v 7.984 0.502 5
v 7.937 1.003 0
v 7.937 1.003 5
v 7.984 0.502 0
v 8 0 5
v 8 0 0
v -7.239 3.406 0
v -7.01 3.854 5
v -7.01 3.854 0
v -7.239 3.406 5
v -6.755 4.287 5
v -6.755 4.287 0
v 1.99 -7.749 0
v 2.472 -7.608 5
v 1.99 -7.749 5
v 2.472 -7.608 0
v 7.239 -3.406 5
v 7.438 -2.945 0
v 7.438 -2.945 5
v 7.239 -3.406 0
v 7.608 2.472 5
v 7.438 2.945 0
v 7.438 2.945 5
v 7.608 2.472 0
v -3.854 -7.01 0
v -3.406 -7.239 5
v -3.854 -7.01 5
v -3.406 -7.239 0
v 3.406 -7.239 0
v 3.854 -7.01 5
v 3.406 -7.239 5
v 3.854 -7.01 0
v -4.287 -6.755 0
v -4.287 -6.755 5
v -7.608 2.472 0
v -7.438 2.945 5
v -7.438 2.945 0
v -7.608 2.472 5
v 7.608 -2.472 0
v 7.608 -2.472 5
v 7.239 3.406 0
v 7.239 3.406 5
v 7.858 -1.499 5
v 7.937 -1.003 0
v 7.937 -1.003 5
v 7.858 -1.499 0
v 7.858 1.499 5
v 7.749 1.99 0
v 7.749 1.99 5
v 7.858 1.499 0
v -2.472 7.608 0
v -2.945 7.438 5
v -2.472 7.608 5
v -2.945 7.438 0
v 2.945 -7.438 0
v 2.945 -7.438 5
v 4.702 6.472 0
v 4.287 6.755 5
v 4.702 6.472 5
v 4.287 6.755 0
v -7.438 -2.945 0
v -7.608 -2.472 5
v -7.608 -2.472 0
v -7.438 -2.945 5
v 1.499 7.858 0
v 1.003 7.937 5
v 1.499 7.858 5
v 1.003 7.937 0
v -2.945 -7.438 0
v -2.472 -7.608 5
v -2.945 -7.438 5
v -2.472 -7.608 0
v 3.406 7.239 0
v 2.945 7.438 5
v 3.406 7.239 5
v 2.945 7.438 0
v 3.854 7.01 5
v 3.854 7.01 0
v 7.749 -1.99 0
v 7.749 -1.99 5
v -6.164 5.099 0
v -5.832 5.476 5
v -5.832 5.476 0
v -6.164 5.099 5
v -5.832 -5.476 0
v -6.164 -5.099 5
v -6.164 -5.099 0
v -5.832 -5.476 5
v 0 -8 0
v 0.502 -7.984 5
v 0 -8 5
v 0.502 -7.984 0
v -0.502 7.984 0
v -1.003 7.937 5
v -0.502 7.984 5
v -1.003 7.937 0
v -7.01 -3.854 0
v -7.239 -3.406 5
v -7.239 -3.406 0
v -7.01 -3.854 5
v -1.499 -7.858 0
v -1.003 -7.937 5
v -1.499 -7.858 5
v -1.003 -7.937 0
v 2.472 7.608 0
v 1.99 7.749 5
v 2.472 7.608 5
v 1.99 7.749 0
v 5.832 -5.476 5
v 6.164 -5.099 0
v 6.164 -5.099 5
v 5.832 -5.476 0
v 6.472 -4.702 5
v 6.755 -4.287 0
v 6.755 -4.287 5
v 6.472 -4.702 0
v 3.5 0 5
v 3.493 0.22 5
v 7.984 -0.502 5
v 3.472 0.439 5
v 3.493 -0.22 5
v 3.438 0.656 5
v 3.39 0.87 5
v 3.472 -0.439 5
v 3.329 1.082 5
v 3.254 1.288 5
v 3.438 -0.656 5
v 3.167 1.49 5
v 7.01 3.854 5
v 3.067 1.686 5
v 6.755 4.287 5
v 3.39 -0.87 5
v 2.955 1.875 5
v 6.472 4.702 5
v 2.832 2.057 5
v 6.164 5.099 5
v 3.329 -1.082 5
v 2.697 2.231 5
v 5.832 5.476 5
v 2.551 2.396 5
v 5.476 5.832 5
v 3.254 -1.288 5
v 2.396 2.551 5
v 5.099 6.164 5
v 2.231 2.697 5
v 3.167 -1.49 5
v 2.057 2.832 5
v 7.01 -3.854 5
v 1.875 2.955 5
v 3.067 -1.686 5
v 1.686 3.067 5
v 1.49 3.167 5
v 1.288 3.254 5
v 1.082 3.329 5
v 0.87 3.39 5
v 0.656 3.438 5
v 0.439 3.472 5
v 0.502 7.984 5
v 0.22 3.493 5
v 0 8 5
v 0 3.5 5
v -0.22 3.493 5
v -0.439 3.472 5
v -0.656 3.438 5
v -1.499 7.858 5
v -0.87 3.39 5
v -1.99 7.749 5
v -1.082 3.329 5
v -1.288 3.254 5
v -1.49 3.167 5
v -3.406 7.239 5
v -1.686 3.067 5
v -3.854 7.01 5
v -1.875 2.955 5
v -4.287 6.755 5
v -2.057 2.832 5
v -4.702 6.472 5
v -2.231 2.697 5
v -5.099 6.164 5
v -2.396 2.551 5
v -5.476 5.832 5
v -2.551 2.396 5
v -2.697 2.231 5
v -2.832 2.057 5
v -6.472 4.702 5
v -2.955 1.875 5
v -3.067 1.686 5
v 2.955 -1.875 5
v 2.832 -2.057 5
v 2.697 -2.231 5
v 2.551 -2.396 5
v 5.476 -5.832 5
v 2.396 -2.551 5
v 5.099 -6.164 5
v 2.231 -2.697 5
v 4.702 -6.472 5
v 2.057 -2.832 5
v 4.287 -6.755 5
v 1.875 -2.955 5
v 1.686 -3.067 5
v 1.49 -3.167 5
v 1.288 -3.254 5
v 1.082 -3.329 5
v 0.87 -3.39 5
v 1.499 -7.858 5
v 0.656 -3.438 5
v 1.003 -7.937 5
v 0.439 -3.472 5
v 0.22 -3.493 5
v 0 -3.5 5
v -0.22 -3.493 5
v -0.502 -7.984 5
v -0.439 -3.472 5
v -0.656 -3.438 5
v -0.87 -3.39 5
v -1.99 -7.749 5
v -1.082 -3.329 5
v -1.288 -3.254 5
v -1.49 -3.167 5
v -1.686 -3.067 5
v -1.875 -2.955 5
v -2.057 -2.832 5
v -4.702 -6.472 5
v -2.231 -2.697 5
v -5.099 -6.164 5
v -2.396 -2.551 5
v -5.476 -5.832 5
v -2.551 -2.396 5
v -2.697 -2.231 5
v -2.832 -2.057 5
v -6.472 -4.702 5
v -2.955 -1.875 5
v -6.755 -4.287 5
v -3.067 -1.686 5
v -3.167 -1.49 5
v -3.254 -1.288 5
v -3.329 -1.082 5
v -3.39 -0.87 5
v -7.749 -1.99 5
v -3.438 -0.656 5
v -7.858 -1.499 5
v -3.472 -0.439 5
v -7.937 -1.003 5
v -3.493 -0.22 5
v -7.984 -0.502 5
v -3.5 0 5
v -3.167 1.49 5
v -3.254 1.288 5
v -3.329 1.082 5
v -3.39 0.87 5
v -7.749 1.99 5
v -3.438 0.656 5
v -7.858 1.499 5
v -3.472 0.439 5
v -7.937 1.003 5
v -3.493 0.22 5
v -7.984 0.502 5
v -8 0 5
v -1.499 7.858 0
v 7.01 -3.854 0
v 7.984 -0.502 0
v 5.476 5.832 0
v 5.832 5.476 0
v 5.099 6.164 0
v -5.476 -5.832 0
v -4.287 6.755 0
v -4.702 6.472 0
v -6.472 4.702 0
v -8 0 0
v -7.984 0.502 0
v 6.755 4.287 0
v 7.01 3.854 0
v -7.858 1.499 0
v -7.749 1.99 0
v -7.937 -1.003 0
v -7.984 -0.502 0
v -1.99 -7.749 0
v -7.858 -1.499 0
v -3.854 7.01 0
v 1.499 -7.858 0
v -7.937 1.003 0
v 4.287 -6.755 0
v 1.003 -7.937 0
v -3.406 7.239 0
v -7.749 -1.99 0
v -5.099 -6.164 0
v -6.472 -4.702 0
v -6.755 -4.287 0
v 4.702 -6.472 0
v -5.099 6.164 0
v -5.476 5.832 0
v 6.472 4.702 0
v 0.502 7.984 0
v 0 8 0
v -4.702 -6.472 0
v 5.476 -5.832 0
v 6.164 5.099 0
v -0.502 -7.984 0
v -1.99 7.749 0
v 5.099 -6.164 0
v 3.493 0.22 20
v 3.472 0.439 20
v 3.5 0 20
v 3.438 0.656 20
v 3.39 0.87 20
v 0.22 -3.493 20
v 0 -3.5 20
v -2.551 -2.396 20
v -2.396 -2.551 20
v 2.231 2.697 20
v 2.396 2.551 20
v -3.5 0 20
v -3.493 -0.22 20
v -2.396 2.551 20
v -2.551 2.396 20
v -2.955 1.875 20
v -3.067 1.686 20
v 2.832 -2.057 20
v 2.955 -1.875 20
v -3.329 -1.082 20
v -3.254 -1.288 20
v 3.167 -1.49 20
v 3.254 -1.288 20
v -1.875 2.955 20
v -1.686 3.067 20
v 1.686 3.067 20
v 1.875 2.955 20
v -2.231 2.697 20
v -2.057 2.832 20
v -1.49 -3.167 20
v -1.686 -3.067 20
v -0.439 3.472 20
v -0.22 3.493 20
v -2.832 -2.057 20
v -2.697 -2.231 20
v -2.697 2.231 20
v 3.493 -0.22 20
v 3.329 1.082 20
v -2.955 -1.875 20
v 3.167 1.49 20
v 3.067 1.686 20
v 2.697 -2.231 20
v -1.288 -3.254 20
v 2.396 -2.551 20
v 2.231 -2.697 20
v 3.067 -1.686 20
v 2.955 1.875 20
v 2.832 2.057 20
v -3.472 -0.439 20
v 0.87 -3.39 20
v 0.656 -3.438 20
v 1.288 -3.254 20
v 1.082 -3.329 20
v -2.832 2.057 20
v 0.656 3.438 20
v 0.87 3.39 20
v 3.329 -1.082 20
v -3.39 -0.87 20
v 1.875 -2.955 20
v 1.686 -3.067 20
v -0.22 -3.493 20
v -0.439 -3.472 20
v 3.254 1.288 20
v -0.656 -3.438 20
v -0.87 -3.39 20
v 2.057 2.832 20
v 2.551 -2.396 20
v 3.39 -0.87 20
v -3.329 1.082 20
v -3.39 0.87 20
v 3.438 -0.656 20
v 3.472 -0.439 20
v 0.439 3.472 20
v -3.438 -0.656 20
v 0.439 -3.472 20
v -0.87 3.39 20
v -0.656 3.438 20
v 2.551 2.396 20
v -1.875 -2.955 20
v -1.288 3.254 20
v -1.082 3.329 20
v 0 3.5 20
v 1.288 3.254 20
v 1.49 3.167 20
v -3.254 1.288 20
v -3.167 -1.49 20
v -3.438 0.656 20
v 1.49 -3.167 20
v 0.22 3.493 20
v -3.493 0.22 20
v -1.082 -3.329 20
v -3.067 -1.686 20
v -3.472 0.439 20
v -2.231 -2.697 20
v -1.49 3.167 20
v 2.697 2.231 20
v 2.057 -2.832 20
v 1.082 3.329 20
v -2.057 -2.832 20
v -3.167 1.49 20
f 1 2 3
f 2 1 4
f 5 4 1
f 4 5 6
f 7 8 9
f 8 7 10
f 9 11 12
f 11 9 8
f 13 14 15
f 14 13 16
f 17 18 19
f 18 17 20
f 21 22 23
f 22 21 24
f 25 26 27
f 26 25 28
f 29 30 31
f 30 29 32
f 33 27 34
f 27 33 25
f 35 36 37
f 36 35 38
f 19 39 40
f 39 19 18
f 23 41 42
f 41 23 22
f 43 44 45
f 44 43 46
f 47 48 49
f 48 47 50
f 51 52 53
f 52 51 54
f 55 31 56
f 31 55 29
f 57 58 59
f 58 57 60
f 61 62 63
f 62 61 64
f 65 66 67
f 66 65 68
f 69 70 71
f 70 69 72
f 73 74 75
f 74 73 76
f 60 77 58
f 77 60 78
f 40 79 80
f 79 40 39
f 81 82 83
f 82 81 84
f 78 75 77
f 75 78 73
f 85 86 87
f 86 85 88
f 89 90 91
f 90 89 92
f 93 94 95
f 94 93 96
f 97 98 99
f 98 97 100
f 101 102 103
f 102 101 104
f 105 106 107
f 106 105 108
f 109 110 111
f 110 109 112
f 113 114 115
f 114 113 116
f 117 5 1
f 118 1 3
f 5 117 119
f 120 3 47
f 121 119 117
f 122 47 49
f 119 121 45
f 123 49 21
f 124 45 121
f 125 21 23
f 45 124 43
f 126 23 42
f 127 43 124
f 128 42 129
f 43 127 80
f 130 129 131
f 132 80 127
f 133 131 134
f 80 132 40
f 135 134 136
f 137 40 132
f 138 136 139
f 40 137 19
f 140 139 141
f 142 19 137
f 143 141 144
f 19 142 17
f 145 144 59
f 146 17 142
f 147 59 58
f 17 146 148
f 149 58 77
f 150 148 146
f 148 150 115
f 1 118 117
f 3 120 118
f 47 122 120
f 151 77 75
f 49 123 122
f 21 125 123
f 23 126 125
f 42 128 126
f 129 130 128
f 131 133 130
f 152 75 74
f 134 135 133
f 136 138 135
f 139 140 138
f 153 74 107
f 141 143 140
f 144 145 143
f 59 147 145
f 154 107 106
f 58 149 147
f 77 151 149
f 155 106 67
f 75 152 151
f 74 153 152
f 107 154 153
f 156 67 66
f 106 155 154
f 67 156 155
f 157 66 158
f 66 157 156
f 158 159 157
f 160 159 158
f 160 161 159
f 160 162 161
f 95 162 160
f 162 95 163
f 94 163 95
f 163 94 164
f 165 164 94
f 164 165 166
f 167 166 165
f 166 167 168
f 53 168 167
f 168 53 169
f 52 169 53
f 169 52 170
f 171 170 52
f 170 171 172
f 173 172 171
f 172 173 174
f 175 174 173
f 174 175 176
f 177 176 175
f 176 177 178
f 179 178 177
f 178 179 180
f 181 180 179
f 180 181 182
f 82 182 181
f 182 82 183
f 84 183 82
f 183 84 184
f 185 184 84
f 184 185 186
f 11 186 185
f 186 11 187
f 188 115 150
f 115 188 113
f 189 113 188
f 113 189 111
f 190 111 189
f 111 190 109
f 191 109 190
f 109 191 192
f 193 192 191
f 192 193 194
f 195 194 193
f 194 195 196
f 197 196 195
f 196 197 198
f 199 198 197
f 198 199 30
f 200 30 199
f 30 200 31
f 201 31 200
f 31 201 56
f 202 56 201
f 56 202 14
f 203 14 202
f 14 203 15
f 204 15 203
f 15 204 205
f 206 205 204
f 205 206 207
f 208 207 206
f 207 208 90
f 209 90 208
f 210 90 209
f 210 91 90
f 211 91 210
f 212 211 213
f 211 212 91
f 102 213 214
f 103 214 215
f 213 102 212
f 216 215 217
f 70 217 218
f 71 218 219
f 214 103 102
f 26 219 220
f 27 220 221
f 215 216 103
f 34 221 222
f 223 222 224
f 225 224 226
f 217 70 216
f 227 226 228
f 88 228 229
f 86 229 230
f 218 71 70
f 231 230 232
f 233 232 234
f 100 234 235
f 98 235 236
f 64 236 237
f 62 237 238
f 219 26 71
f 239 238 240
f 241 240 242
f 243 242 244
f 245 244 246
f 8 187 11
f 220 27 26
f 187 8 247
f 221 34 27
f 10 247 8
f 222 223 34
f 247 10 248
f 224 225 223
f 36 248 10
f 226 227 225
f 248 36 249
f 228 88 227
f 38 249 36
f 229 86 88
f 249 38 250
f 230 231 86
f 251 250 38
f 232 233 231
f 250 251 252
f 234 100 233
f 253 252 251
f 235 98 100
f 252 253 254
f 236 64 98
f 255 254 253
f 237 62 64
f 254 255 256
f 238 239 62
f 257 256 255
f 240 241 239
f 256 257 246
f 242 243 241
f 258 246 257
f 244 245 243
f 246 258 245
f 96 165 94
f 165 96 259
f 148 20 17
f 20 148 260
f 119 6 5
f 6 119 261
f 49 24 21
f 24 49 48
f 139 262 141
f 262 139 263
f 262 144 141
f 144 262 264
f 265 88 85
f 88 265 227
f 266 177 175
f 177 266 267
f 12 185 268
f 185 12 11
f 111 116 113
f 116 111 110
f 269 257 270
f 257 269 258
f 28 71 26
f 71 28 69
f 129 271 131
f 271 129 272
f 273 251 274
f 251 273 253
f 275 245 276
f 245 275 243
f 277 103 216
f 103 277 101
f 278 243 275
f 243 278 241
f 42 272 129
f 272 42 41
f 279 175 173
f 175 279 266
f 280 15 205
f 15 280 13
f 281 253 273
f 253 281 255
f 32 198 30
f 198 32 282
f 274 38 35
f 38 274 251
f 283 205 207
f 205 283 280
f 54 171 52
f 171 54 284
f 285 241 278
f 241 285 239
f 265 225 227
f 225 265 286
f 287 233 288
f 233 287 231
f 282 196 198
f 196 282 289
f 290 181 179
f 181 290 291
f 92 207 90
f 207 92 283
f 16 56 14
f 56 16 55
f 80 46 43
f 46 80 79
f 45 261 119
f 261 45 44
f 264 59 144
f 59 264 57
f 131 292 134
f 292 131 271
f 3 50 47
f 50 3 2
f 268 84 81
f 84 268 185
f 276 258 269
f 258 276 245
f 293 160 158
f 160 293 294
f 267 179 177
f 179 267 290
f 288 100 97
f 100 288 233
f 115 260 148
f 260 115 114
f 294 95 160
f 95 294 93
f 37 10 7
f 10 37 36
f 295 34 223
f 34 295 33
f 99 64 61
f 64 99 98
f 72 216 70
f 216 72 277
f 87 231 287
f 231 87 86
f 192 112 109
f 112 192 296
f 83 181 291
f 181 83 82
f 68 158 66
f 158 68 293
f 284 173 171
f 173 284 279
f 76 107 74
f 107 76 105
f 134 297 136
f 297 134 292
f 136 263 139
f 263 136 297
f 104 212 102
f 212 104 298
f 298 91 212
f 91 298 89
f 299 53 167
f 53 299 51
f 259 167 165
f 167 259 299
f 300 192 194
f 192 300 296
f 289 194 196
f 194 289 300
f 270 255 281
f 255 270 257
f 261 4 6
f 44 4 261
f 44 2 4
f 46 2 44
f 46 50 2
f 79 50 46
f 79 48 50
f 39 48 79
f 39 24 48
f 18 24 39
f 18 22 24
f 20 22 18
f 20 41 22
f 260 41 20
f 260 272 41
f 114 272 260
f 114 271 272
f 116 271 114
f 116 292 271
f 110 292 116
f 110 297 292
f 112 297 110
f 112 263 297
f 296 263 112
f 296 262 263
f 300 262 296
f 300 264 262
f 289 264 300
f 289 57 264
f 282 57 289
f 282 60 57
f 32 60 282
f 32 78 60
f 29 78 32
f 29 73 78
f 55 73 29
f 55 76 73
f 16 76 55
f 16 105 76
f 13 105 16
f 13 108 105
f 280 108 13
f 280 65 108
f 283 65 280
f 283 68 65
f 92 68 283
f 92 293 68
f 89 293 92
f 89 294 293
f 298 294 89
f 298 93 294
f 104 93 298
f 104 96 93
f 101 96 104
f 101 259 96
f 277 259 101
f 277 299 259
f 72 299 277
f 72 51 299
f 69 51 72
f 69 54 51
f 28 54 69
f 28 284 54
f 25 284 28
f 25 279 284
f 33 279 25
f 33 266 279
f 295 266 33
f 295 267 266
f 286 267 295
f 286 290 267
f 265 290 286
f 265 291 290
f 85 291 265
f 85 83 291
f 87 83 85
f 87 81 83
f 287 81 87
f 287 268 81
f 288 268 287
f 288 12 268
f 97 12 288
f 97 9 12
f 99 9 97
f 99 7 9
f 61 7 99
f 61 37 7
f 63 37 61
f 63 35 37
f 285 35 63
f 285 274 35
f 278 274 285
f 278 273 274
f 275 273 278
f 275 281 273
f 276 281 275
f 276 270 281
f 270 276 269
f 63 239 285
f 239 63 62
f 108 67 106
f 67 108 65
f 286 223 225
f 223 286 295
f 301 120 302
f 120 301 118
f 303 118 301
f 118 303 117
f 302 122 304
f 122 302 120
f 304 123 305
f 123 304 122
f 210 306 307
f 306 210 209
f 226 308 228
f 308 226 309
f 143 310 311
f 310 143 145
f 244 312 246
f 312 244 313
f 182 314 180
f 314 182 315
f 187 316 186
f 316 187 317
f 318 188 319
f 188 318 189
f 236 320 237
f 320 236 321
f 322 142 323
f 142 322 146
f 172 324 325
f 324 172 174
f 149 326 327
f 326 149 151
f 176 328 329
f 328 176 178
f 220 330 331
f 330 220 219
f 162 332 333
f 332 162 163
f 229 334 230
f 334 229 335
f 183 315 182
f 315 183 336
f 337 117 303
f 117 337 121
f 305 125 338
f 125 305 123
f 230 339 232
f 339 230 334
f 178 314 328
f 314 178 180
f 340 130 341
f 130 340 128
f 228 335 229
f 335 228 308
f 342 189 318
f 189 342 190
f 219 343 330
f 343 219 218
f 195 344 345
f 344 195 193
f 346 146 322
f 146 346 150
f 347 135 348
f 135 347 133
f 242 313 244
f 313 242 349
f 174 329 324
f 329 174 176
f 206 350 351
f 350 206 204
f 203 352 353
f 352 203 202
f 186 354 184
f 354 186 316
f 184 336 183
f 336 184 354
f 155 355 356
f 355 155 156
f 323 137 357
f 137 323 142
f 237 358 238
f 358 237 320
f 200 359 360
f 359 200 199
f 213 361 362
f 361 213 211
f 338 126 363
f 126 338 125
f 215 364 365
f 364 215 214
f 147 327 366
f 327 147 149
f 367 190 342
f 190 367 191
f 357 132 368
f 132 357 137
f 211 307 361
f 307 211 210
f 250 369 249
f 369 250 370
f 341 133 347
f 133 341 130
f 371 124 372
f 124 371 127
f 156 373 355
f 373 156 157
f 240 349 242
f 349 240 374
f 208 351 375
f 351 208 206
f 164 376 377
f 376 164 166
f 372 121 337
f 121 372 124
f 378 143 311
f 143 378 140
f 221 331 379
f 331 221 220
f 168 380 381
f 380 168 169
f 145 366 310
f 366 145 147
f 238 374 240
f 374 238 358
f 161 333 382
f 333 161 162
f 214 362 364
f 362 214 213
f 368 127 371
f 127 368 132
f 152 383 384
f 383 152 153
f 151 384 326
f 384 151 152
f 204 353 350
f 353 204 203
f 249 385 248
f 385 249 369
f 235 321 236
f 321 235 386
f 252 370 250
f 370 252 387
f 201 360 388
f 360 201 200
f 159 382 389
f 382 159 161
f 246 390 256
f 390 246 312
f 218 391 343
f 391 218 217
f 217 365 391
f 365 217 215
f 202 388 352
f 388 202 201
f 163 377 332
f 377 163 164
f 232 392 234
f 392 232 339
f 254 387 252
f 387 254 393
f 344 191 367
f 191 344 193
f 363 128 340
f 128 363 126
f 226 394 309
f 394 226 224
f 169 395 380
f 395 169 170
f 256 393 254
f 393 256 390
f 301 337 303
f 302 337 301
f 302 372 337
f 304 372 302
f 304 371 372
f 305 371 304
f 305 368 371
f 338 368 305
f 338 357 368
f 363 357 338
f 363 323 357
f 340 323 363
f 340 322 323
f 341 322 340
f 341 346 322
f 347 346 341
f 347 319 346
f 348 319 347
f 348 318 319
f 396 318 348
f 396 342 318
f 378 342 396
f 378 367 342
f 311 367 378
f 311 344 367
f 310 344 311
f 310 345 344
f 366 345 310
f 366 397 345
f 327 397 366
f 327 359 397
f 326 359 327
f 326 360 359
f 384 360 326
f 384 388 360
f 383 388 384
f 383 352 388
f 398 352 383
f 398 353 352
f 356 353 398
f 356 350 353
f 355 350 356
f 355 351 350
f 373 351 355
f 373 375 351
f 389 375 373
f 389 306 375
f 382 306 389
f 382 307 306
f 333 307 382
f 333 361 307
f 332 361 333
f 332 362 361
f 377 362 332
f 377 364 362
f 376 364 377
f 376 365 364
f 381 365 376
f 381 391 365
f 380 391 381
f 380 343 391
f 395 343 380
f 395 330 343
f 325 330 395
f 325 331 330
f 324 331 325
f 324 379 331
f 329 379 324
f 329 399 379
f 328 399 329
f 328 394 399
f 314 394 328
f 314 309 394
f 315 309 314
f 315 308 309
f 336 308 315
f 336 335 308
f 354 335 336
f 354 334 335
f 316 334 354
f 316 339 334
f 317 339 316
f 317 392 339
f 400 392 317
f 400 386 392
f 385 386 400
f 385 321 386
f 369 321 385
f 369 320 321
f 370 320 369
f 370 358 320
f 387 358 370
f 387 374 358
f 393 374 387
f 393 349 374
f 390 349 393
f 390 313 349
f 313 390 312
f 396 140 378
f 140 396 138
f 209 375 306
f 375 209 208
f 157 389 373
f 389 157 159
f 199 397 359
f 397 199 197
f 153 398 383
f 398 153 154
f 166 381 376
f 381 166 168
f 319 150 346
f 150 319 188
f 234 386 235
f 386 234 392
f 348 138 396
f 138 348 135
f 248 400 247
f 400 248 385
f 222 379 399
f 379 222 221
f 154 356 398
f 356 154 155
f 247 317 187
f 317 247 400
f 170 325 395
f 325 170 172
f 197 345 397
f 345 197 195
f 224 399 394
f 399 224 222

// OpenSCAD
union() {
  cylinder(d=16, h=5, $fn=100);
  cylinder(d=7, h=20, $fn=100);
}
